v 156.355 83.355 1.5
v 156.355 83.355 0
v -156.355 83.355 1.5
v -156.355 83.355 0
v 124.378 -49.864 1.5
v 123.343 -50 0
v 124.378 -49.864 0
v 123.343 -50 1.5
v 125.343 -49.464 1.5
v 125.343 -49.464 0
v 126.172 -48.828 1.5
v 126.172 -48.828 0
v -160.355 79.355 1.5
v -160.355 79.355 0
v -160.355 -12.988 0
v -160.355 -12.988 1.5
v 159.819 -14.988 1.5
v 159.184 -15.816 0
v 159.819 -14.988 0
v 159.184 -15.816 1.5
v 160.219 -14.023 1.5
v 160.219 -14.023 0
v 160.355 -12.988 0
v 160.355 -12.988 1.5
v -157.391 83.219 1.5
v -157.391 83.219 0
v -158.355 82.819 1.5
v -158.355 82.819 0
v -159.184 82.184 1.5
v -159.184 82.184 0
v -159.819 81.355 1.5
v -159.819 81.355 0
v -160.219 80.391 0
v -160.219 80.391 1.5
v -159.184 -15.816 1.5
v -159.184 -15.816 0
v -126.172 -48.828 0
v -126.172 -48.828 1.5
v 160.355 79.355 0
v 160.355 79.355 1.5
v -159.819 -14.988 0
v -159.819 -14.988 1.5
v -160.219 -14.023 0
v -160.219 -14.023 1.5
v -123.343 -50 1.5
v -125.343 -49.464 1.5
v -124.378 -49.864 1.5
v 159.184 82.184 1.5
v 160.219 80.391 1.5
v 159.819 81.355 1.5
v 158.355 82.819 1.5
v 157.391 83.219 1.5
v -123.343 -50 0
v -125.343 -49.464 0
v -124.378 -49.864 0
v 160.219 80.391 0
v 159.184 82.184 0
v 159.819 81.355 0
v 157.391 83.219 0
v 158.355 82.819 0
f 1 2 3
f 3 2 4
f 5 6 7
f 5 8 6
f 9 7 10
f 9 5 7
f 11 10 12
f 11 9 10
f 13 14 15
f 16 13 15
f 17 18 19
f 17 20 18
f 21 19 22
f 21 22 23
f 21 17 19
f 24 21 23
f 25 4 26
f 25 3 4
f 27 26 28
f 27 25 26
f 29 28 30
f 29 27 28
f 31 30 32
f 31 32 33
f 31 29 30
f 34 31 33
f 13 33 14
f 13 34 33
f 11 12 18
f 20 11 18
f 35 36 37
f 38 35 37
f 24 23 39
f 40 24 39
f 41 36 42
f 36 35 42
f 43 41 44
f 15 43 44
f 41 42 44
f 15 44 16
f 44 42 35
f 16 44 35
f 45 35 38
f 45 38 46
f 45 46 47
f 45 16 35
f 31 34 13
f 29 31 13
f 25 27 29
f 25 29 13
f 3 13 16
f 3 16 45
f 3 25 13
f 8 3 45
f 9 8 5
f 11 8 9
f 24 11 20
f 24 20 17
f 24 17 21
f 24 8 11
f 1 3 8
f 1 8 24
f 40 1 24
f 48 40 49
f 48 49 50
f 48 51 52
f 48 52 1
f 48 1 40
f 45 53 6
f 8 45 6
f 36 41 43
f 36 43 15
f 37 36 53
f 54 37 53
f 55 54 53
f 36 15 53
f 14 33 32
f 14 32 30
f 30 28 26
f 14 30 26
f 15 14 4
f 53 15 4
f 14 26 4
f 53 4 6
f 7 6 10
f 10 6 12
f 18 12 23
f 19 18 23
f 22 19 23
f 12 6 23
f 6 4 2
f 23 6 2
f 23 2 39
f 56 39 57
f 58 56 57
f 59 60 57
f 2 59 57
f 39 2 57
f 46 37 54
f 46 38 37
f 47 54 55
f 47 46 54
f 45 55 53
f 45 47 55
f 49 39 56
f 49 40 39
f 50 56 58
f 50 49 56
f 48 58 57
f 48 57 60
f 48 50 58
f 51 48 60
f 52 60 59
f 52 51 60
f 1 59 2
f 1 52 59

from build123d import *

# Parameters (mm, degrees)
F1_DEPTH = 1.5
F2_R     = 4


# Not quite as in the source:
# - a feature names something its author has since deleted; it is built from what else it names


with BuildPart() as f1:
    # F0 (on Top) → F1 (new body)
    with BuildSketch(Plane.XY):
        Polygon((-160.3553390593, -14.6446609407), (-125, -50), (125, -50), (160.3553390593, -14.6446609407), (160.3553390593, 83.3553390593), (-160.3553390593, 83.3553390593), align=None)
        Polygon((-118.7867965644, -35), (-145.3553390593, -8.4314575051), (-145.3553390593, 68.3553390593), (145.3553390593, 68.3553390593), (145.3553390593, -8.4314575051), (118.7867965644, -35), align=None, mode=Mode.SUBTRACT)
        Polygon((-145.3553390593, 68.3553390593), (-145.3553390593, -8.4314575051), (-118.7867965644, -35), (118.7867965644, -35), (145.3553390593, -8.4314575051), (145.3553390593, 68.3553390593), align=None)
    extrude(amount=F1_DEPTH)

    # F2
    f2_edges = [f1.edges().sort_by_distance(p)[0] for p in [
        (160.355339, -14.644661, 0.75),
        (125, -50, 0.75),
        (160.355339, 83.355339, 0.75),
        (-125, -50, 0.75),
        (-160.355339, -14.644661, 0.75),
        (-160.355339, 83.355339, 0.75),
    ]]
    fillet(f2_edges, radius=F2_R)


solid = f1.part
